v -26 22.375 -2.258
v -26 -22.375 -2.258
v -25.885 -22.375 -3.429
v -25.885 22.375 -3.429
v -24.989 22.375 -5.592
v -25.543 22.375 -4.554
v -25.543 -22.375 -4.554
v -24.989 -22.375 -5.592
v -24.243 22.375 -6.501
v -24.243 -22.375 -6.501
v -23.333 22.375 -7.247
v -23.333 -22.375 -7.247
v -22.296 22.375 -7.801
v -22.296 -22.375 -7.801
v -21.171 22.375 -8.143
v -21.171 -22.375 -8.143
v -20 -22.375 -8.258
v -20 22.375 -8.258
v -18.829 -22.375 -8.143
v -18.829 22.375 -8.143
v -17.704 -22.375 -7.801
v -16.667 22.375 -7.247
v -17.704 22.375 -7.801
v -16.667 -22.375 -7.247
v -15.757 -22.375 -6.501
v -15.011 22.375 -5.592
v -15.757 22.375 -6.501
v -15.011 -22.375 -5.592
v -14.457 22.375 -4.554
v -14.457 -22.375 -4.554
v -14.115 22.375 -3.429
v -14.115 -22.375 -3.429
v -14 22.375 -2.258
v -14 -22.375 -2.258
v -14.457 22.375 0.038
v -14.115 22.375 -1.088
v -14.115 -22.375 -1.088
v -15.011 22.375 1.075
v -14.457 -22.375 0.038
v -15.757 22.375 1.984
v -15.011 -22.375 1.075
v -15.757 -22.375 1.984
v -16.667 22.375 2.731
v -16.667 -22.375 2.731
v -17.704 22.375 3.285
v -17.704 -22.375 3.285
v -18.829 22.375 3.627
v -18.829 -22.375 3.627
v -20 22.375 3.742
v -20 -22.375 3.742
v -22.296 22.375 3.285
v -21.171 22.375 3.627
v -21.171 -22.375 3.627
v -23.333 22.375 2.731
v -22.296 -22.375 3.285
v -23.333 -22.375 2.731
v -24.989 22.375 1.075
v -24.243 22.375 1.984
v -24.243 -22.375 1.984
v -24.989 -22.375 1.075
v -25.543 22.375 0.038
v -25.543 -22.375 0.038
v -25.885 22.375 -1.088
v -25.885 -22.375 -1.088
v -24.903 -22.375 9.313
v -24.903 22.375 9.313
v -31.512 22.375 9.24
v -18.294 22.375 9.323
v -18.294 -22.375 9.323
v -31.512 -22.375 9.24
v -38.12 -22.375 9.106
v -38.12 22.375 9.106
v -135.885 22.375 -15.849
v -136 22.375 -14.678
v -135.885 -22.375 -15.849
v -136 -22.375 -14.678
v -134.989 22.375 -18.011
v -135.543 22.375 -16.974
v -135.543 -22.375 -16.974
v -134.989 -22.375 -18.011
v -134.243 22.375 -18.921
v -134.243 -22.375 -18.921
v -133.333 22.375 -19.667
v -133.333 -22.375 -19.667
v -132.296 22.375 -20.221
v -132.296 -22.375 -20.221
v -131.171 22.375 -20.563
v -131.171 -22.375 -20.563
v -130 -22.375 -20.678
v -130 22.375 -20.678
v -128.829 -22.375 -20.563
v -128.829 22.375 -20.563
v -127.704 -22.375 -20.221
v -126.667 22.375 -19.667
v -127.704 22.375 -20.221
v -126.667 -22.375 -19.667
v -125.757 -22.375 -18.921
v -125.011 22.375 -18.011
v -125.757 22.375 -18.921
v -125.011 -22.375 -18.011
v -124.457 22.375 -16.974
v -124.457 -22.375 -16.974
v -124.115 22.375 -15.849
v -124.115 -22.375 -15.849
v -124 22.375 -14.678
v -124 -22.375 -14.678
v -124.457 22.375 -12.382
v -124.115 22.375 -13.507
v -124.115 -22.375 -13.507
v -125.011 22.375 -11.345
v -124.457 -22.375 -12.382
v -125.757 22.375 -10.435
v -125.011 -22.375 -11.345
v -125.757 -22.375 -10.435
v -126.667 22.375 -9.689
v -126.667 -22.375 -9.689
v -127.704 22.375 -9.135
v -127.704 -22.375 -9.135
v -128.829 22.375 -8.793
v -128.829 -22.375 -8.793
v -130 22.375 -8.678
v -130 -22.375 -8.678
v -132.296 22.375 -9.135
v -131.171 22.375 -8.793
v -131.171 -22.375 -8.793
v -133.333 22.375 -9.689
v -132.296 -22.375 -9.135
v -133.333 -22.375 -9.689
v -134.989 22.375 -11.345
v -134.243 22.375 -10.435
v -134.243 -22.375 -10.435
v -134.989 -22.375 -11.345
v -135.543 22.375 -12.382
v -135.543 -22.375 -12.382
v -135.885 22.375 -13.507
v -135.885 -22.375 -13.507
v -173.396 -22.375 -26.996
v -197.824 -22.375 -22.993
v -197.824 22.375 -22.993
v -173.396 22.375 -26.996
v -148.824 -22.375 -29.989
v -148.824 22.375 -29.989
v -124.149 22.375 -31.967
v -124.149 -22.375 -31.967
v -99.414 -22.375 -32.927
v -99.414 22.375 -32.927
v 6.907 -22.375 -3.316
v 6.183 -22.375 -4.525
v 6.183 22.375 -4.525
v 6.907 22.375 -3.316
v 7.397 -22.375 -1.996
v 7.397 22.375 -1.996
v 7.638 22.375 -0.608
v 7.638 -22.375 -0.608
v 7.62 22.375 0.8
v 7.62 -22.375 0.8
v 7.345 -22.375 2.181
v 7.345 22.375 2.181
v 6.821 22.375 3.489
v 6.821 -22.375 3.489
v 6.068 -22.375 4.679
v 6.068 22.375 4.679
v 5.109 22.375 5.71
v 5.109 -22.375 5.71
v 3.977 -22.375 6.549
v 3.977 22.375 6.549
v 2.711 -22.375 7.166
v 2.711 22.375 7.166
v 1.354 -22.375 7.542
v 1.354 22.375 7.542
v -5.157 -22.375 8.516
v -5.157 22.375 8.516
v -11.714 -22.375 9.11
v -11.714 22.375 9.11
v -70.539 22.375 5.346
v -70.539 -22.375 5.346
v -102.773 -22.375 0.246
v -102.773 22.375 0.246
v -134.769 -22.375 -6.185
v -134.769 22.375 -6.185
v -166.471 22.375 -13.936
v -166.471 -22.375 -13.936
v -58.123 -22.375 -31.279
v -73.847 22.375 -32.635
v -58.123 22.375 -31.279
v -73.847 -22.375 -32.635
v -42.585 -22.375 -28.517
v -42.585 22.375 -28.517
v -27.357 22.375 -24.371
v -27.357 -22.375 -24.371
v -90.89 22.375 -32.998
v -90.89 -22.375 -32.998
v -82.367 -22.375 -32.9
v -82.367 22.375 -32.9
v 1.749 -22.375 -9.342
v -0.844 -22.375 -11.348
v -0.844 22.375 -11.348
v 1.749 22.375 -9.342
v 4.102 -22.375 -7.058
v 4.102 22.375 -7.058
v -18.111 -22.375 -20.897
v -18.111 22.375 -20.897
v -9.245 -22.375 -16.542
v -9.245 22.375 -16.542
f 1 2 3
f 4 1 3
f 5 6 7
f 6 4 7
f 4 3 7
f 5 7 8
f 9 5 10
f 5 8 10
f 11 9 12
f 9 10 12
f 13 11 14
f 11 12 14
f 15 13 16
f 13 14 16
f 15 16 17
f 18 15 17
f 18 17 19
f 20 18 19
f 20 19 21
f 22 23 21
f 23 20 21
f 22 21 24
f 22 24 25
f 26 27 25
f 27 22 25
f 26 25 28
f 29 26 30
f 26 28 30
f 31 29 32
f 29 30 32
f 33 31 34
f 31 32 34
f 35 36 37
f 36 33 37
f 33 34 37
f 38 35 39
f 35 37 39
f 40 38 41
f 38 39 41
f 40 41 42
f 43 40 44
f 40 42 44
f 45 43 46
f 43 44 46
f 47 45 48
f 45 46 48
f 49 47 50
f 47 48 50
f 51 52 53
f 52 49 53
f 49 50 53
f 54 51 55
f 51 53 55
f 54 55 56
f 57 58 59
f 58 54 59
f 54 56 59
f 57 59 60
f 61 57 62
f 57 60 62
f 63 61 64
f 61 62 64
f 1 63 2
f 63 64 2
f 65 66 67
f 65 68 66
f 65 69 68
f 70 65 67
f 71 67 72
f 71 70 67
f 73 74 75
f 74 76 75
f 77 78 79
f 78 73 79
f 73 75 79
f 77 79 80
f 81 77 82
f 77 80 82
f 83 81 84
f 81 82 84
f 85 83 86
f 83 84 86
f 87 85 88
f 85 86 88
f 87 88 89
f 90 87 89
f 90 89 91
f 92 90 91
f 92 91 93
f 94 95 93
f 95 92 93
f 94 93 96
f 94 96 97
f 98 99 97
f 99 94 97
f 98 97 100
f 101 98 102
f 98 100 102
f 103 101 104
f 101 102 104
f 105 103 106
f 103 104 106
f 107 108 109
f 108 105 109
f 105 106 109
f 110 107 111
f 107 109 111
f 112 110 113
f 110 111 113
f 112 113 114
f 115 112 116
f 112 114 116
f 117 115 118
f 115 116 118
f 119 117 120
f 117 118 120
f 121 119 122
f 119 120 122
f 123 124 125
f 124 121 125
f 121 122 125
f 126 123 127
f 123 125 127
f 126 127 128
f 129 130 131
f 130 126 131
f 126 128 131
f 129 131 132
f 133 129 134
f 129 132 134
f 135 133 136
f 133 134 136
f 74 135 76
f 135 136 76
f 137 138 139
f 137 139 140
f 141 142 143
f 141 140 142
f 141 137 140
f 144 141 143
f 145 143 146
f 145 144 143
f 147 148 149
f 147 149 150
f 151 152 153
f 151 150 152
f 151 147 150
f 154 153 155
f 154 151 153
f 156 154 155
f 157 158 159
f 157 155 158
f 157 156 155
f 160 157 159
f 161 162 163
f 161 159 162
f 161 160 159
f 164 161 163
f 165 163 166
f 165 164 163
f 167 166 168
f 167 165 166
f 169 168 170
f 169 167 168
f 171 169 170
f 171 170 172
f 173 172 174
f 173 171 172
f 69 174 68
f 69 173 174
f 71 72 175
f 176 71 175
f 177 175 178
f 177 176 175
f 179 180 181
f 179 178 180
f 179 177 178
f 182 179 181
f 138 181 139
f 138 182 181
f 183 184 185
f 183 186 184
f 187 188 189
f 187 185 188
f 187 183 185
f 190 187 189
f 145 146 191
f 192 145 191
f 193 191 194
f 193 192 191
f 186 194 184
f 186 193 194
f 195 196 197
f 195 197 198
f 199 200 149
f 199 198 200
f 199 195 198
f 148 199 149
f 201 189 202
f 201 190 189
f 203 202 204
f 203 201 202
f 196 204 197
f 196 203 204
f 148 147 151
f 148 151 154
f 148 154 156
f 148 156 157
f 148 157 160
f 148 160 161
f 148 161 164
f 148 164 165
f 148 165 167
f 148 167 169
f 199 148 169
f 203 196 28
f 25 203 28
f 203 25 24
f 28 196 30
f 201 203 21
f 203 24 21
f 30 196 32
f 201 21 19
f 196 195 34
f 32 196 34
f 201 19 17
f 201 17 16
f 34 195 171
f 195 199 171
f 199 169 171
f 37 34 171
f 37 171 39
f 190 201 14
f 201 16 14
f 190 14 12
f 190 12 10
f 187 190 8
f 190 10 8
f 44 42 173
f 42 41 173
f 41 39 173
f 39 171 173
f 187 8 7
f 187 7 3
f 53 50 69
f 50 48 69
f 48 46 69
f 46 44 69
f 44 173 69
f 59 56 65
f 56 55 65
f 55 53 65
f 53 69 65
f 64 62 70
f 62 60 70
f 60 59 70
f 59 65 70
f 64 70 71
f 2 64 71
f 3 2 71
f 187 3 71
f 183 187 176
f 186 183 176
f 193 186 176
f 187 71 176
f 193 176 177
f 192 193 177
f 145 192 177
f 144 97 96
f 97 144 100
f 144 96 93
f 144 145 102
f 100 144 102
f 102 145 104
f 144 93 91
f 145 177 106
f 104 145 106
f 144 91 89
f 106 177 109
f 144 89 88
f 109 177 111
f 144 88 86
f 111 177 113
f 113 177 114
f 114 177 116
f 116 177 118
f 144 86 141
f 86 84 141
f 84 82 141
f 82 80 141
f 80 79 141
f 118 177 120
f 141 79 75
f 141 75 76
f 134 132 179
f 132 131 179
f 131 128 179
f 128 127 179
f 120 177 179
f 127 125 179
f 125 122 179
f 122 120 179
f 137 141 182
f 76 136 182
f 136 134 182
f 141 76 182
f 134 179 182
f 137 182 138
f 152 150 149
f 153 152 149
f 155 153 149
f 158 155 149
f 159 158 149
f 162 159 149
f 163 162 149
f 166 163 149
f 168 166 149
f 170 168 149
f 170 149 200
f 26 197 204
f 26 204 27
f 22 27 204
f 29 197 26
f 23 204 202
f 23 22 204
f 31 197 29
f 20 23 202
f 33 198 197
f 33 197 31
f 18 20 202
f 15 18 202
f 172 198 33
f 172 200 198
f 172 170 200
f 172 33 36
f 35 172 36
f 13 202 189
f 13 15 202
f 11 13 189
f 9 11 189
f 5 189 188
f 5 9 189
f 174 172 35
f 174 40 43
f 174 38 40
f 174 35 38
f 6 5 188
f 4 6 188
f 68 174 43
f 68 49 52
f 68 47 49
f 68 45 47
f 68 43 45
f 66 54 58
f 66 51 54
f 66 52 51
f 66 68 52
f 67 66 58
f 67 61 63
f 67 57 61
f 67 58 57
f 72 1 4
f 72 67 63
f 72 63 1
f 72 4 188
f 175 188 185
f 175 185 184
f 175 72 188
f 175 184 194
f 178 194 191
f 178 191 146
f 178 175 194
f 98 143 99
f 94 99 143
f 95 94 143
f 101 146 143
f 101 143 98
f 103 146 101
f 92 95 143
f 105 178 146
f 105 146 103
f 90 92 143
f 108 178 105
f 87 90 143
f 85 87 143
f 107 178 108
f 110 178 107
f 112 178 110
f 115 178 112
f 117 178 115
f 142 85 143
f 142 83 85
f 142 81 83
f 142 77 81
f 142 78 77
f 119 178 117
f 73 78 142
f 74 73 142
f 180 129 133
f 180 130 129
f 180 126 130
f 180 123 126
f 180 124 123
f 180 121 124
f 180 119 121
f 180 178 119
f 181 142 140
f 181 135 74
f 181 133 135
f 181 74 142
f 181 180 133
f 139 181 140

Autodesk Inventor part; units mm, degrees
ref_plane "YZ Plane" through (0, 0, 0) normal (1, 0, 0) x (0, 1, 0)
ref_plane "XZ Plane" through (0, 0, 0) normal (0, 1, 0) x (-1, 0, 0)
ref_plane "XY Plane" through (0, 0, 0) normal (0, 0, 1) x (1, 0, 0)
sketch "スケッチ1" plane through (0, 0, 0) normal (0, 1, 0) x (-1, 0, 0)
  arc A0 (99.4141, -32.927) -> (197.8245, -22.9934) centre (88.5018, 567.6156) ccw projected
  arc A1 (73.8469, -32.6347) -> (99.4141, -32.927) centre (91.566, 398.982) ccw projected
  arc A2 (27.3573, -24.3709) -> (73.8469, -32.6347) centre (81.048, 142.776) ccw projected
  arc A3 (0.844, -11.3484) -> (27.3573, -24.3709) centre (58.458, 72.45) ccw projected
  arc A4 (-6.1834, -4.5246) -> (0.844, -11.3484) centre (17.4, 12.732) ccw projected
  arc A5 (-1.3535, 7.5415) -> (-6.1834, -4.5246) centre (0, 0) ccw projected
  arc A6 (18.2937, 9.3227) -> (-1.3535, 7.5415) centre (18.66, -103.968) ccw projected
  arc A7 (38.1205, 9.1058) -> (18.2937, 9.3227) centre (20.556, -690.396) ccw projected
  arc A8 (197.8245, -22.9934) -> (38.1205, 9.1058) centre (-36.3979, -774.9853) ccw projected
  circle A9 centre (20, -2.2582) radius 6 projected
  circle A10 centre (130, -14.678) radius 6 projected
extrude "押し出し2" add sketch "スケッチ1" along normal mid plane 44.75
properties part number "uretan_mc" material "ポリエチレン、高密度"
